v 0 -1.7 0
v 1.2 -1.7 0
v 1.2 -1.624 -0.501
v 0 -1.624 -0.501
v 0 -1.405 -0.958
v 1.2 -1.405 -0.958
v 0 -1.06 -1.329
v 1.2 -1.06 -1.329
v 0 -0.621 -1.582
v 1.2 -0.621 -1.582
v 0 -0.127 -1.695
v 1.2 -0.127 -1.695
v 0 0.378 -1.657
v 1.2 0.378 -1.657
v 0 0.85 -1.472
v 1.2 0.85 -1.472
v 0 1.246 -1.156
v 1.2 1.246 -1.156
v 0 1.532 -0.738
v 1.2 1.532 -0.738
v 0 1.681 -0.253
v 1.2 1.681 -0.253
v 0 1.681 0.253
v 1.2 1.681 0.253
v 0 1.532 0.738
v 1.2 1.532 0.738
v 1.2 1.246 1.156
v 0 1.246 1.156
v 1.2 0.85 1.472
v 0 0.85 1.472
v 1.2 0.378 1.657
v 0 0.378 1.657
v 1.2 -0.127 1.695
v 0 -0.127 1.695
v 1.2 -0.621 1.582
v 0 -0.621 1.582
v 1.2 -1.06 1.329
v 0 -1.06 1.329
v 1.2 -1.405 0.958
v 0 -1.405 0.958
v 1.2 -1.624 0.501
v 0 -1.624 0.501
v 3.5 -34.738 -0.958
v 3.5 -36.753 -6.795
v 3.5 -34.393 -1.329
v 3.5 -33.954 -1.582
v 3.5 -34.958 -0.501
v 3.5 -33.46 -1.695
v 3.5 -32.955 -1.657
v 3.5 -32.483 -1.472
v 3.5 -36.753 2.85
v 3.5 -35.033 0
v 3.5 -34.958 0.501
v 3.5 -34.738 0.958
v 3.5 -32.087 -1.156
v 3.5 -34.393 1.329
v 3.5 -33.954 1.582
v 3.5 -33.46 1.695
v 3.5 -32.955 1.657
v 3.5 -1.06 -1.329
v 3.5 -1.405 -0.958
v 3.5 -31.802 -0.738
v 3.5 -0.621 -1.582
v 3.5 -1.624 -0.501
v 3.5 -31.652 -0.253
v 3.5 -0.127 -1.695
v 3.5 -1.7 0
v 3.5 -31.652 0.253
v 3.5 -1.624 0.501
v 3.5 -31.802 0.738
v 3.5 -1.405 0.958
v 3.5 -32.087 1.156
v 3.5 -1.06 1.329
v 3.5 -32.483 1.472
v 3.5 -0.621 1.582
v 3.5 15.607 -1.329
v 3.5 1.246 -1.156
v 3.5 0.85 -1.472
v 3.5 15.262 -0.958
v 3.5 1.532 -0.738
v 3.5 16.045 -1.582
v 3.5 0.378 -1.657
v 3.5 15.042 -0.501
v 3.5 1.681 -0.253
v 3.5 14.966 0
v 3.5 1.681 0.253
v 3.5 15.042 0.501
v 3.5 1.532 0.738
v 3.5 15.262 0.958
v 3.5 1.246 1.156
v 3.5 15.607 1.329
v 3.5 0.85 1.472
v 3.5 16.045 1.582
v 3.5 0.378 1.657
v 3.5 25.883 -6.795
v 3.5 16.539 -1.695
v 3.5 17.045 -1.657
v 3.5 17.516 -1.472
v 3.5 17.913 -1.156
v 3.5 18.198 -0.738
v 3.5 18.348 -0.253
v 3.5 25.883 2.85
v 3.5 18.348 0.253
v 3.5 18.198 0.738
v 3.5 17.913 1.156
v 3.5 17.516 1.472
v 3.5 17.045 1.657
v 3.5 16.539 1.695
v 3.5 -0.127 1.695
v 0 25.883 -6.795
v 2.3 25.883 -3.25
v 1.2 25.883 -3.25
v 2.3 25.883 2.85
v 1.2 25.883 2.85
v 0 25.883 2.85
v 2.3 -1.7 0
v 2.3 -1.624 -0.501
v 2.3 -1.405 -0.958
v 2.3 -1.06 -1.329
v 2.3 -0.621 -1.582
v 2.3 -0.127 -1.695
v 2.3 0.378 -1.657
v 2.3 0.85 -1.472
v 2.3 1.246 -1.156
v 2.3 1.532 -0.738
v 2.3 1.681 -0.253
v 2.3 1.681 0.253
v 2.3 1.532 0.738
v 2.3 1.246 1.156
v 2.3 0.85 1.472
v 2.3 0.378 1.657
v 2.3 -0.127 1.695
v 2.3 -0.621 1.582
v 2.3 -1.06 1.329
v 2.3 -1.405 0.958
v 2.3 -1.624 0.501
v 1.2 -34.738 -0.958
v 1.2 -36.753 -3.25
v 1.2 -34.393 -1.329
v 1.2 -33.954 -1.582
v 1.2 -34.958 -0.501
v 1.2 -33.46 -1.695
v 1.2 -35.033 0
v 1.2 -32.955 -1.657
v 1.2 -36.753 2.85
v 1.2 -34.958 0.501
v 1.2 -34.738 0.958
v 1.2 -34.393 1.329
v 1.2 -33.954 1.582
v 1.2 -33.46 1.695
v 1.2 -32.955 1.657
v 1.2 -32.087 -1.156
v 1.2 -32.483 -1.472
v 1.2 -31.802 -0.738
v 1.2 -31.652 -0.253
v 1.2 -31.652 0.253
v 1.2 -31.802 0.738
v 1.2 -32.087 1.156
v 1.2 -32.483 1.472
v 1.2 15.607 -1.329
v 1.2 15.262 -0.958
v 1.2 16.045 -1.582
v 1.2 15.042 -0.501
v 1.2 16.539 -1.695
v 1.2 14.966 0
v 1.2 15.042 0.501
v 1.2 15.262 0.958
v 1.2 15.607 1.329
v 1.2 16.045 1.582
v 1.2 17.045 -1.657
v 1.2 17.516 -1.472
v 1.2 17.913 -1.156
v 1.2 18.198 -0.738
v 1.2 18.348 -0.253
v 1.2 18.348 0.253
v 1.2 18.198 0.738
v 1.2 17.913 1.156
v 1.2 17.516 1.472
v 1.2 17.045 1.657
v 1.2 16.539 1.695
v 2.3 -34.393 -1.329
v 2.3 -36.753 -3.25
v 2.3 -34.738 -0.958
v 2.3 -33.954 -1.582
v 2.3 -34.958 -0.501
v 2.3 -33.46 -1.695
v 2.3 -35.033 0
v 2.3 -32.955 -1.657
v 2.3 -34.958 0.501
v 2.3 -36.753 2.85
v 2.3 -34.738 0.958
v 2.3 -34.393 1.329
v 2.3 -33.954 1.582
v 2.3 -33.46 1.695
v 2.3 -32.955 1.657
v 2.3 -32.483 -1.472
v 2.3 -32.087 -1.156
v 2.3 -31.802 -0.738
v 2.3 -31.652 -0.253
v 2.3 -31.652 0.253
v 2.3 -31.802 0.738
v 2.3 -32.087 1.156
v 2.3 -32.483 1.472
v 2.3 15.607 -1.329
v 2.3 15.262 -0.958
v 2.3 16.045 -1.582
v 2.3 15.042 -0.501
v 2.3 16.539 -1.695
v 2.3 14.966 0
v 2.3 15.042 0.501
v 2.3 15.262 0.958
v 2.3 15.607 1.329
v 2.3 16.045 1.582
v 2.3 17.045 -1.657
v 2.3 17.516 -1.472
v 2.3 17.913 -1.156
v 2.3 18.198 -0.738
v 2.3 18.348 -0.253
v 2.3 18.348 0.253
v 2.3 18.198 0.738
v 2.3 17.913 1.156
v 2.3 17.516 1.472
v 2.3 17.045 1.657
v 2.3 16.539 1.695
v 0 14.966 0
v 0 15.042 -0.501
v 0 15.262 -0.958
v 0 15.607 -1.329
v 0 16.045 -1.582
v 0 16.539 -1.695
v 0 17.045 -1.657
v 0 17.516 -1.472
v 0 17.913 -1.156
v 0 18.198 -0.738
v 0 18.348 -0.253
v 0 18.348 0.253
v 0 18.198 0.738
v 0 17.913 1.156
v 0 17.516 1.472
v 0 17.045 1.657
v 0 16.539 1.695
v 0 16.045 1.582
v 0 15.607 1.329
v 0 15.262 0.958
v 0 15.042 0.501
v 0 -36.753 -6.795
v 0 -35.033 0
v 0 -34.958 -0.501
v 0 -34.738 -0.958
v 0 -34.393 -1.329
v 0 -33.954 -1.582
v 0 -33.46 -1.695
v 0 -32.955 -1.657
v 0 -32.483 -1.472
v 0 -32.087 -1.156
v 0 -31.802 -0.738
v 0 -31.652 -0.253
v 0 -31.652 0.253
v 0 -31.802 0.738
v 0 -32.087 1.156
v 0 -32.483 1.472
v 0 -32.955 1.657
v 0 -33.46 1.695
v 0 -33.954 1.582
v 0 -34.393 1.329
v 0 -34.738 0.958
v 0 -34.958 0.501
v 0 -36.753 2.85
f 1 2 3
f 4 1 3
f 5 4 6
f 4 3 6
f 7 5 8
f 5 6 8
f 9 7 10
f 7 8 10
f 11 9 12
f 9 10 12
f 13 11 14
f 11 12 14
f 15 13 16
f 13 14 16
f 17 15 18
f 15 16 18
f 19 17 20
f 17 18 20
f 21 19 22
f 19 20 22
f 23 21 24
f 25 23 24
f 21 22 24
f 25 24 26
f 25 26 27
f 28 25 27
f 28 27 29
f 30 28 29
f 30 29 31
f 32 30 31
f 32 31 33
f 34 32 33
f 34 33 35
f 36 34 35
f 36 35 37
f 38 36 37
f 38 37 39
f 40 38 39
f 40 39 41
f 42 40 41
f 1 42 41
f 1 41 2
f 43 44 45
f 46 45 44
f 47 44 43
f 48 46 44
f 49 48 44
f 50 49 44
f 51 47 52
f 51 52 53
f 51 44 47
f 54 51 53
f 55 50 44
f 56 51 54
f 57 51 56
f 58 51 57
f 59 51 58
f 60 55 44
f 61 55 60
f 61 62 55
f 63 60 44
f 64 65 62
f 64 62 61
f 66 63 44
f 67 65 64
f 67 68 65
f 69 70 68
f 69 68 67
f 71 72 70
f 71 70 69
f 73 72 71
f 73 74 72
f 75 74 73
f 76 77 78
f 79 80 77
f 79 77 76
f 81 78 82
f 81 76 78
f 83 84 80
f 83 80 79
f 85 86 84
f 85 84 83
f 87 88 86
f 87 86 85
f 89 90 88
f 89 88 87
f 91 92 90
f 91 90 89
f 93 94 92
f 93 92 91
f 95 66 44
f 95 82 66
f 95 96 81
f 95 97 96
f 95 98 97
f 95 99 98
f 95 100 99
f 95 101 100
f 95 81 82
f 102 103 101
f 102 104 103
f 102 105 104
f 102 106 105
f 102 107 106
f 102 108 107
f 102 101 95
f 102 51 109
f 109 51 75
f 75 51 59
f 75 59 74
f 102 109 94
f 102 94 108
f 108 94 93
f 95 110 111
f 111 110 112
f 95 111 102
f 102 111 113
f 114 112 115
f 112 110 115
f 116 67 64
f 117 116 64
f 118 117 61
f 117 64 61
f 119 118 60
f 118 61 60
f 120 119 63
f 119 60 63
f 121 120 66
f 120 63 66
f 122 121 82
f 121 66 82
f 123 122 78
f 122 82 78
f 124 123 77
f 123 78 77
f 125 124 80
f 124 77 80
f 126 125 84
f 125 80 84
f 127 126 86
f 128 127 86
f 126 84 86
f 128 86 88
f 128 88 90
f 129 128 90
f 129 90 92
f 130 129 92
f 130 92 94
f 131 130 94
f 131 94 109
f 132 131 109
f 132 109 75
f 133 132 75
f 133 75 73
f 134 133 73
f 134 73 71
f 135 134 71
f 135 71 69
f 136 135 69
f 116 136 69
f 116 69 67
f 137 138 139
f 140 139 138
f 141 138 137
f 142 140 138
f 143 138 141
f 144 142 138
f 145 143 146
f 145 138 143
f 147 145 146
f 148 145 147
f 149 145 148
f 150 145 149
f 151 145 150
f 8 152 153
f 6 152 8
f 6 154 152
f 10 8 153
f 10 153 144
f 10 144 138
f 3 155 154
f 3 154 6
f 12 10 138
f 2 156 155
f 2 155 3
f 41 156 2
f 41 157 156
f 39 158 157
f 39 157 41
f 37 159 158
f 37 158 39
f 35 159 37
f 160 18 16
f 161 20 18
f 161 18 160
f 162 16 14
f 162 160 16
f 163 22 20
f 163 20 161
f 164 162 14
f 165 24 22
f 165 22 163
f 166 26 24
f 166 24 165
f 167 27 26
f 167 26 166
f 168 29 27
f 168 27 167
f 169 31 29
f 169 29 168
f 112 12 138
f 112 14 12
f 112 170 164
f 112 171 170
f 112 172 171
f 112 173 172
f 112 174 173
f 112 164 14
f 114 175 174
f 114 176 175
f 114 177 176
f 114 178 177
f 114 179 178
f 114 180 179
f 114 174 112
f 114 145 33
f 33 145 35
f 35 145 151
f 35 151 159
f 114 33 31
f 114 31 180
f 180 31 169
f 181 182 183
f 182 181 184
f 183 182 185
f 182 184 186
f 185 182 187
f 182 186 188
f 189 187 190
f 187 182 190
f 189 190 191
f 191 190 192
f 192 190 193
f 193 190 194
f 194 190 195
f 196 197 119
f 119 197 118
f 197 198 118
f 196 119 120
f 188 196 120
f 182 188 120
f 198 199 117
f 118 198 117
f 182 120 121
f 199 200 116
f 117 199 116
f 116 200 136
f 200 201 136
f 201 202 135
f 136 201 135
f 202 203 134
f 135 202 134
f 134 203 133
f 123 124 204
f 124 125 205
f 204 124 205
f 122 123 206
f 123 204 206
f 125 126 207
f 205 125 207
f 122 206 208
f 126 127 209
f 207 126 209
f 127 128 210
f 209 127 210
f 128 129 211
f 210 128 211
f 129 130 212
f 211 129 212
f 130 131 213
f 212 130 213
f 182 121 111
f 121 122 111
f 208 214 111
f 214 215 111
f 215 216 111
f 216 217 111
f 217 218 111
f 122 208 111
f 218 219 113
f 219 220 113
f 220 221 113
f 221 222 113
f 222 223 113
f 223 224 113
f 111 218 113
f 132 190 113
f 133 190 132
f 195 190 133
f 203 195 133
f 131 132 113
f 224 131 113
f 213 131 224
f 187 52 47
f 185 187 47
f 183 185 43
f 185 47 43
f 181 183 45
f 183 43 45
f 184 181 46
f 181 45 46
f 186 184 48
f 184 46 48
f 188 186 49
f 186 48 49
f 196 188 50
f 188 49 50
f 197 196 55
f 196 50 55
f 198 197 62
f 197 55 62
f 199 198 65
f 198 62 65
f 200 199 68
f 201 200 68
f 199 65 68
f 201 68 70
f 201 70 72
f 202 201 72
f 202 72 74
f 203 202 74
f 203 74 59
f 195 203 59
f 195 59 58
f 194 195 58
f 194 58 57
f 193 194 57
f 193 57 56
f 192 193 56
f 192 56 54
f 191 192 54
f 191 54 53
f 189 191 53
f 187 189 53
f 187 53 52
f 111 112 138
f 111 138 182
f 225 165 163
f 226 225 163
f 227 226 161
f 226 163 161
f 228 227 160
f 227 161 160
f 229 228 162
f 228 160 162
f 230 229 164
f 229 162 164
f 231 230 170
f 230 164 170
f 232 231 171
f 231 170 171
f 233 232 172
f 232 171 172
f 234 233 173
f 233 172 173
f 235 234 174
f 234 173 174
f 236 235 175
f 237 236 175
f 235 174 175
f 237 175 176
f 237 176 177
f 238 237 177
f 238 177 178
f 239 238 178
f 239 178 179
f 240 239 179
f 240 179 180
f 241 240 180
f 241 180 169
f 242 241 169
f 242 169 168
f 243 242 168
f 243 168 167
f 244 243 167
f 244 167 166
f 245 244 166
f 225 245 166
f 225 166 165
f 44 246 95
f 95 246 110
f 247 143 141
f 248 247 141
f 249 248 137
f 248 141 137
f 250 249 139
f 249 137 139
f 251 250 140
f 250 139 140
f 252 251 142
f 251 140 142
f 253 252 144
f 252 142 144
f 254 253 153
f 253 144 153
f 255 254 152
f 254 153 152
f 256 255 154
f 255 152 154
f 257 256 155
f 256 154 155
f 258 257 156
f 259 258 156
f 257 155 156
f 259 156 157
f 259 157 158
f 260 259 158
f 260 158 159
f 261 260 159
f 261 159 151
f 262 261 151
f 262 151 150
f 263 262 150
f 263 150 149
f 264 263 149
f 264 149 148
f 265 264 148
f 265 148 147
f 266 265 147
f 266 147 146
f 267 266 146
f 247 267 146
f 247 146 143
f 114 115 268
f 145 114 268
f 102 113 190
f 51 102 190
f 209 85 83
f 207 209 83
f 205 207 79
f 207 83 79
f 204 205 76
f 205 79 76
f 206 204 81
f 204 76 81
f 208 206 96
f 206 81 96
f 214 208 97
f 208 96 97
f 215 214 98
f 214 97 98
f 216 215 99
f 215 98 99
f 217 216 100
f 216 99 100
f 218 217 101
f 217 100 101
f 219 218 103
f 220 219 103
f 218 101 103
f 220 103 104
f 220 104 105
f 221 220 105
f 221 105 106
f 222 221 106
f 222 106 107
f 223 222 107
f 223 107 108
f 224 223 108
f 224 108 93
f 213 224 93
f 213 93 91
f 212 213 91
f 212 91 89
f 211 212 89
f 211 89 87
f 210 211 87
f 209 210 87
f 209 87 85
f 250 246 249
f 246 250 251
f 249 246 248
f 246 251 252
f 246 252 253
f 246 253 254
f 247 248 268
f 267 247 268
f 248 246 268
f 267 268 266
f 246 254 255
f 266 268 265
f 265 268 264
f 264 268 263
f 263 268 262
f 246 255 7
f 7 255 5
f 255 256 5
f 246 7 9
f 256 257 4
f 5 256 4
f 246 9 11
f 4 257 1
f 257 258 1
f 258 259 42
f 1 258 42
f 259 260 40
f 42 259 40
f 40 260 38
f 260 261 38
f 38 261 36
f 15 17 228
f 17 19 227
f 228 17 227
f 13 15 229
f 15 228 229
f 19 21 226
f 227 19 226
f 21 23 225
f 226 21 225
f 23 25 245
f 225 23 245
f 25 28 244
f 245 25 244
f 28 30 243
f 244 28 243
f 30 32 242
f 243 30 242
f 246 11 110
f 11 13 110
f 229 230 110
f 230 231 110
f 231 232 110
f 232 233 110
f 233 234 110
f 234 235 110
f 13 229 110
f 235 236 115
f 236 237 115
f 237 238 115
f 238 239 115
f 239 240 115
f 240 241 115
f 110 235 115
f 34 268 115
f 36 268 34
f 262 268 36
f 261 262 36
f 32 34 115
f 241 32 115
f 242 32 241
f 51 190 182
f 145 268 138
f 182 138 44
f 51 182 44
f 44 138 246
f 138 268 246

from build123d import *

# Parameters (mm, degrees)
F1_DEPTH = 3.5
F2_W     = 0.55
F2_H     = 62.6362580806
F3_DEPTH = 6.1
F4_D     = 3.4


with BuildPart() as f1:
    # F0 (on Right) → F1 (new body)
    with BuildSketch(Plane.YZ):
        Polygon((25.8831996471, 2.85), (-36.7530584335, 2.85), (-36.7530584335, -6.7950769342), (25.8831996471, -6.7950769342), (25.8831996471, 0), align=None)
    extrude(amount=F1_DEPTH)

    # F2 (on face) → F3 (cut)
    with BuildSketch(Plane.XY.offset(2.85)):
        with Locations((1.475, -5.4349293932)):
            Rectangle(F2_W, F2_H)
        with Locations((2.025, -5.4349293932)):
            Rectangle(F2_W, F2_H)
    extrude(amount=-F3_DEPTH, mode=Mode.SUBTRACT)

    # F4 (through all)
    with Locations(Plane(origin=(0, 0, 0), x_dir=(0, 1, 0), z_dir=(-1, 0, 0))):
        with Locations((16.6665, 0), (-33.3333, 0), (0, 0)):
            Hole(F4_D / 2)


solid = f1.part
